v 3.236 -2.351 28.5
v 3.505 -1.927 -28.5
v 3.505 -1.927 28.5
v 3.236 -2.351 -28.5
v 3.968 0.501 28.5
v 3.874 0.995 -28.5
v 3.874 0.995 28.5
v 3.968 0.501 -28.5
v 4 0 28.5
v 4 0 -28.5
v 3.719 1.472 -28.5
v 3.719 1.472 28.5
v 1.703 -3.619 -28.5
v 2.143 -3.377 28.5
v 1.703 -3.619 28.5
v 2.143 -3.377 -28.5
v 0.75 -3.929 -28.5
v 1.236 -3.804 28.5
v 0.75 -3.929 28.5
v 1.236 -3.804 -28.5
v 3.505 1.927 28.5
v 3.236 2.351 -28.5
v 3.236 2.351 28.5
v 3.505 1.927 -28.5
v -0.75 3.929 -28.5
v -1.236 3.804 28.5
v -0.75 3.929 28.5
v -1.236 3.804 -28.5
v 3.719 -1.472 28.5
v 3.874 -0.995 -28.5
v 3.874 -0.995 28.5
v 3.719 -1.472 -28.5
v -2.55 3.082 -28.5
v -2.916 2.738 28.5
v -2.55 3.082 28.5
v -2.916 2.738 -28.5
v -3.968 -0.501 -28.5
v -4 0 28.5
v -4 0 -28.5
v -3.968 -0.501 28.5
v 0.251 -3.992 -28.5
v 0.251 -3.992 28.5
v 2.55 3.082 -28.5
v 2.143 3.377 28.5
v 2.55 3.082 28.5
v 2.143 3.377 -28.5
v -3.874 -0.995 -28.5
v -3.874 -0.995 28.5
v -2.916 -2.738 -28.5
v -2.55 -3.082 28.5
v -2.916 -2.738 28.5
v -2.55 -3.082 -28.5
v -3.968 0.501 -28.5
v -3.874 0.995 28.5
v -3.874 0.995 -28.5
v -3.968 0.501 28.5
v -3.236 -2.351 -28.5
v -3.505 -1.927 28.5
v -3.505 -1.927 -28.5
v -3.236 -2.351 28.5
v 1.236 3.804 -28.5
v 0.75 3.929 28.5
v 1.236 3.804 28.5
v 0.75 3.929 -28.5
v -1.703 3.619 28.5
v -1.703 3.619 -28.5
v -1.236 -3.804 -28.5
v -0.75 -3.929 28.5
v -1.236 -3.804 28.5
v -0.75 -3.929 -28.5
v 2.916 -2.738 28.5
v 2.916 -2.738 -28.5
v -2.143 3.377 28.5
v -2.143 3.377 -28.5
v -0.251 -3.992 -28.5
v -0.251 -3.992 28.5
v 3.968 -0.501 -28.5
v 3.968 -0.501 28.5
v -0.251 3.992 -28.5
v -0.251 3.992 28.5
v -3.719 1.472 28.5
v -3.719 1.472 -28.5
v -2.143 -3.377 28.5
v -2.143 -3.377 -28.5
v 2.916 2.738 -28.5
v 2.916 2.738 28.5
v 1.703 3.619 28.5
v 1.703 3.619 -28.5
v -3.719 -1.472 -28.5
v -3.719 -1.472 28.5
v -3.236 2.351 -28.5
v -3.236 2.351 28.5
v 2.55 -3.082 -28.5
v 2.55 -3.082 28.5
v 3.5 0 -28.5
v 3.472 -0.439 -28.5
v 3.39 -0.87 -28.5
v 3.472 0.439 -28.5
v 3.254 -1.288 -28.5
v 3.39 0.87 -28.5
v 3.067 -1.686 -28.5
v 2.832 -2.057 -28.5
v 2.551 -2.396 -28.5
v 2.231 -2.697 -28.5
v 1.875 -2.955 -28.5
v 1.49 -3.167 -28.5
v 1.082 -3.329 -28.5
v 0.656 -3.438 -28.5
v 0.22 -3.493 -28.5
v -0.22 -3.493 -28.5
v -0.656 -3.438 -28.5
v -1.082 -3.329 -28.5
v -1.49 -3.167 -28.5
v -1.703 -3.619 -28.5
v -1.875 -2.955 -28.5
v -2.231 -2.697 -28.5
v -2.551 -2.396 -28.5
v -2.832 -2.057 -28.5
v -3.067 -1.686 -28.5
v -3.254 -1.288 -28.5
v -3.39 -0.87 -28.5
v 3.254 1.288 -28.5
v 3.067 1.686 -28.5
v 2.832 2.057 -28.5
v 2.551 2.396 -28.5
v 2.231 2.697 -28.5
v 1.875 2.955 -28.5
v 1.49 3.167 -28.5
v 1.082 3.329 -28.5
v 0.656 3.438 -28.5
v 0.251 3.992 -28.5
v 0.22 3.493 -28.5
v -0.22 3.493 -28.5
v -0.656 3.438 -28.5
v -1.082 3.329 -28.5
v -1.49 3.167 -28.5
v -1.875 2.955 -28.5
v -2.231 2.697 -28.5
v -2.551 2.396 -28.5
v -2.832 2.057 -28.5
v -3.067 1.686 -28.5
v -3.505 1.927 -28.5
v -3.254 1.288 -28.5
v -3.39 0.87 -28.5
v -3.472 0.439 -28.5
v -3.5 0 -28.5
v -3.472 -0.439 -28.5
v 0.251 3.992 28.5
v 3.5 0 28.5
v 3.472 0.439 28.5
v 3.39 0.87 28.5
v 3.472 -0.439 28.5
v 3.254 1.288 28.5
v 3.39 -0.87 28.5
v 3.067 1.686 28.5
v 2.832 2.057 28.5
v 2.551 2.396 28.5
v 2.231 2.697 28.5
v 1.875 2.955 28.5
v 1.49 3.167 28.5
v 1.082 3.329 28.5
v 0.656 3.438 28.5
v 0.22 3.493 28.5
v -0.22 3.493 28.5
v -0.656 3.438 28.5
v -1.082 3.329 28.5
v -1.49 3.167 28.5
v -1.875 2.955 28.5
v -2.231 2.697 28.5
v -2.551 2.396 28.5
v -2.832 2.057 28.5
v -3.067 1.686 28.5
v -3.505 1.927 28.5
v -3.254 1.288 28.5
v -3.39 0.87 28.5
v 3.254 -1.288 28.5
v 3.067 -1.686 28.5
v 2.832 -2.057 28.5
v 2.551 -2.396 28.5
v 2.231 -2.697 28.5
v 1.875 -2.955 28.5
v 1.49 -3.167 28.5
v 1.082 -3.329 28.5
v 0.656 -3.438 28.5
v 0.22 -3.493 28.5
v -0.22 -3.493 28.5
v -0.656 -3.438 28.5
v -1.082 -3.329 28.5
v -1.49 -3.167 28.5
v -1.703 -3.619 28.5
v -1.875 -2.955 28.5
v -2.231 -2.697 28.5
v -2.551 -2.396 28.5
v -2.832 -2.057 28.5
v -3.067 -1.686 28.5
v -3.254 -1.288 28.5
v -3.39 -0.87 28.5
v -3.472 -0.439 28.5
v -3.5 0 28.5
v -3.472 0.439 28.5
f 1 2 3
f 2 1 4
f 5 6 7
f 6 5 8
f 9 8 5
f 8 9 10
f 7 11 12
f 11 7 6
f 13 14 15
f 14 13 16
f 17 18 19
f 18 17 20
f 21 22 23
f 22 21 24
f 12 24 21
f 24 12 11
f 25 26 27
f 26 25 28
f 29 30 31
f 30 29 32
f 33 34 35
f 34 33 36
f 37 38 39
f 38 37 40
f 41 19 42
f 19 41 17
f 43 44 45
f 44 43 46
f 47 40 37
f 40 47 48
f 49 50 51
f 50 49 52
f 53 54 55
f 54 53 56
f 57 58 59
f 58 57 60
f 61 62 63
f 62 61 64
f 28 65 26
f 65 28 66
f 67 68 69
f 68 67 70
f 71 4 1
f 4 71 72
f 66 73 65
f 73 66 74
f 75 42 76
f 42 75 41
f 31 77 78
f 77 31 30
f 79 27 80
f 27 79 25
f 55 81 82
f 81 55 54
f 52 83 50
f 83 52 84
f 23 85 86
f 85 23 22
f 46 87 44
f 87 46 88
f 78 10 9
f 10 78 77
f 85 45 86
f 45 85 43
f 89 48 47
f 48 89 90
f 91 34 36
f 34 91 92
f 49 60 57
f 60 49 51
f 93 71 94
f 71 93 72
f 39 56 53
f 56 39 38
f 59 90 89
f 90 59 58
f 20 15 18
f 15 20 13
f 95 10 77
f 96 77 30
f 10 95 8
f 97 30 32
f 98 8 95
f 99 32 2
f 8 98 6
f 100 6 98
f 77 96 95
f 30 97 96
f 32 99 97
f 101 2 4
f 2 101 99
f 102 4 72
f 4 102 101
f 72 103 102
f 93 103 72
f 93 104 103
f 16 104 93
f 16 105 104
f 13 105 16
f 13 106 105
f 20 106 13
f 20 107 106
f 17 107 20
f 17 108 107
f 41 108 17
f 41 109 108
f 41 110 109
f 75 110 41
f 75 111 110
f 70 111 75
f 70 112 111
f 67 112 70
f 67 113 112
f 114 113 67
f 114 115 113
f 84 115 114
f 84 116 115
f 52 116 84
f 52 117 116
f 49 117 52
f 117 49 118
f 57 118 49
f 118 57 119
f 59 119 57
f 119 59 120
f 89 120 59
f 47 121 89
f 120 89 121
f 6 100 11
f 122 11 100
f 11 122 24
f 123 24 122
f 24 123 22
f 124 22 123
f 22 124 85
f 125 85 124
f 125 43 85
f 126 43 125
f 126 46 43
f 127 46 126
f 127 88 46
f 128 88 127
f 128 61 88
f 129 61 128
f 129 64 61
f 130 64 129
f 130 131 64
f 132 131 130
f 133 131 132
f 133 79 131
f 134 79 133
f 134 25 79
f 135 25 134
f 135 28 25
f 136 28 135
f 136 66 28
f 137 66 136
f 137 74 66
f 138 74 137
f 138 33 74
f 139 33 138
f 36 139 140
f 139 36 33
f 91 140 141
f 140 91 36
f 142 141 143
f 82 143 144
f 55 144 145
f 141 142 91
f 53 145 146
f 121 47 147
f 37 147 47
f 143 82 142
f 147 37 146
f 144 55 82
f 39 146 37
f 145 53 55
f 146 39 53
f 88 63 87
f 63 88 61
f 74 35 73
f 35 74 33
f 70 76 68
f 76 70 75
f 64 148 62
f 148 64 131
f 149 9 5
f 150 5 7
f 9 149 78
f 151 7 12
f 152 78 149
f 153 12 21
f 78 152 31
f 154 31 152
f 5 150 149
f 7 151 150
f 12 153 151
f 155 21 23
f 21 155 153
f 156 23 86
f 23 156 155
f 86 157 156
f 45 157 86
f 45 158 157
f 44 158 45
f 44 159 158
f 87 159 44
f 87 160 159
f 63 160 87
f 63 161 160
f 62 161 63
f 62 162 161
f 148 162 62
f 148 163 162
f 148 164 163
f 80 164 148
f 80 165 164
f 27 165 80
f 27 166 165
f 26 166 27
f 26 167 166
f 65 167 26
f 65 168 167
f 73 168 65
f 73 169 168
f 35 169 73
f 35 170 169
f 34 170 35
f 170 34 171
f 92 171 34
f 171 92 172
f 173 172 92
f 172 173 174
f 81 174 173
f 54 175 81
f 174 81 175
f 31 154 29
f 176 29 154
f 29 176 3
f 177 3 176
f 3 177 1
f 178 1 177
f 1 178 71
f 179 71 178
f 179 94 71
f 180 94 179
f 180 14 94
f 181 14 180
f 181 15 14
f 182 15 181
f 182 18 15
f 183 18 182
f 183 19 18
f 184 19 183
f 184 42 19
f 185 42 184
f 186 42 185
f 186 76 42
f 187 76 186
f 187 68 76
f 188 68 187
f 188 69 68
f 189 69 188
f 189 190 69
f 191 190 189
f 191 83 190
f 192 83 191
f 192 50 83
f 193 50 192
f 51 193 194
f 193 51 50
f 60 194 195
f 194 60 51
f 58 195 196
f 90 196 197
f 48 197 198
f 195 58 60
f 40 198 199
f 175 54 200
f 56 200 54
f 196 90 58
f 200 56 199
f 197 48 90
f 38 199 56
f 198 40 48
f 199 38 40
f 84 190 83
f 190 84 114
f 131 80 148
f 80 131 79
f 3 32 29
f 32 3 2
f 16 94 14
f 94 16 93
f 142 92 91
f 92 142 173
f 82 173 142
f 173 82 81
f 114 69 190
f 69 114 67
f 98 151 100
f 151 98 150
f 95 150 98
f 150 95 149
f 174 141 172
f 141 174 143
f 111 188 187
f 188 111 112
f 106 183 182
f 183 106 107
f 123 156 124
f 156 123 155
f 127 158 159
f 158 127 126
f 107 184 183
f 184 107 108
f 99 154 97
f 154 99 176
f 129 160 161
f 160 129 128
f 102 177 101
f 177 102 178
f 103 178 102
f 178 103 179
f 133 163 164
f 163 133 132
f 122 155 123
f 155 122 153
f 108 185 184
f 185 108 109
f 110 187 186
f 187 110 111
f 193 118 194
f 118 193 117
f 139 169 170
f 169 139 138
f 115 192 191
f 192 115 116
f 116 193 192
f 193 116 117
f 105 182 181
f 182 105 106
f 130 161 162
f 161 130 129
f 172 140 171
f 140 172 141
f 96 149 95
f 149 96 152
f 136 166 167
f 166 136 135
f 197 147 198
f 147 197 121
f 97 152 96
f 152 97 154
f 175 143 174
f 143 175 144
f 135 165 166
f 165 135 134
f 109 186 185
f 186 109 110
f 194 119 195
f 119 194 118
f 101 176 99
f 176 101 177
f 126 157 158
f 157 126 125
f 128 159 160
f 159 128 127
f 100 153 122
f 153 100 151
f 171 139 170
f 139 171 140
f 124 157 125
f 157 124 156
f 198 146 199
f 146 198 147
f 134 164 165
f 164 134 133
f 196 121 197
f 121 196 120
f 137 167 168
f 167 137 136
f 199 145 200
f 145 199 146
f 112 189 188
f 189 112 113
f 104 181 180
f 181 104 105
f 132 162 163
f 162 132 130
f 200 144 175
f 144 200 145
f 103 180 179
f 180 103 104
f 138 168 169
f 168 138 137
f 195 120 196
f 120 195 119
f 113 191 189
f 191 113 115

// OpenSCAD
$fn = 50;


difference() {
	union() {
		translate(v = [0, 0, -28.5000000000]) {
			cylinder(h = 57, r = 4.0000000000);
		}
	}
	union() {
		translate(v = [0, 0, -100.0000000000]) {
			cylinder(h = 200, r = 3.5000000000);
		}
	}
}
